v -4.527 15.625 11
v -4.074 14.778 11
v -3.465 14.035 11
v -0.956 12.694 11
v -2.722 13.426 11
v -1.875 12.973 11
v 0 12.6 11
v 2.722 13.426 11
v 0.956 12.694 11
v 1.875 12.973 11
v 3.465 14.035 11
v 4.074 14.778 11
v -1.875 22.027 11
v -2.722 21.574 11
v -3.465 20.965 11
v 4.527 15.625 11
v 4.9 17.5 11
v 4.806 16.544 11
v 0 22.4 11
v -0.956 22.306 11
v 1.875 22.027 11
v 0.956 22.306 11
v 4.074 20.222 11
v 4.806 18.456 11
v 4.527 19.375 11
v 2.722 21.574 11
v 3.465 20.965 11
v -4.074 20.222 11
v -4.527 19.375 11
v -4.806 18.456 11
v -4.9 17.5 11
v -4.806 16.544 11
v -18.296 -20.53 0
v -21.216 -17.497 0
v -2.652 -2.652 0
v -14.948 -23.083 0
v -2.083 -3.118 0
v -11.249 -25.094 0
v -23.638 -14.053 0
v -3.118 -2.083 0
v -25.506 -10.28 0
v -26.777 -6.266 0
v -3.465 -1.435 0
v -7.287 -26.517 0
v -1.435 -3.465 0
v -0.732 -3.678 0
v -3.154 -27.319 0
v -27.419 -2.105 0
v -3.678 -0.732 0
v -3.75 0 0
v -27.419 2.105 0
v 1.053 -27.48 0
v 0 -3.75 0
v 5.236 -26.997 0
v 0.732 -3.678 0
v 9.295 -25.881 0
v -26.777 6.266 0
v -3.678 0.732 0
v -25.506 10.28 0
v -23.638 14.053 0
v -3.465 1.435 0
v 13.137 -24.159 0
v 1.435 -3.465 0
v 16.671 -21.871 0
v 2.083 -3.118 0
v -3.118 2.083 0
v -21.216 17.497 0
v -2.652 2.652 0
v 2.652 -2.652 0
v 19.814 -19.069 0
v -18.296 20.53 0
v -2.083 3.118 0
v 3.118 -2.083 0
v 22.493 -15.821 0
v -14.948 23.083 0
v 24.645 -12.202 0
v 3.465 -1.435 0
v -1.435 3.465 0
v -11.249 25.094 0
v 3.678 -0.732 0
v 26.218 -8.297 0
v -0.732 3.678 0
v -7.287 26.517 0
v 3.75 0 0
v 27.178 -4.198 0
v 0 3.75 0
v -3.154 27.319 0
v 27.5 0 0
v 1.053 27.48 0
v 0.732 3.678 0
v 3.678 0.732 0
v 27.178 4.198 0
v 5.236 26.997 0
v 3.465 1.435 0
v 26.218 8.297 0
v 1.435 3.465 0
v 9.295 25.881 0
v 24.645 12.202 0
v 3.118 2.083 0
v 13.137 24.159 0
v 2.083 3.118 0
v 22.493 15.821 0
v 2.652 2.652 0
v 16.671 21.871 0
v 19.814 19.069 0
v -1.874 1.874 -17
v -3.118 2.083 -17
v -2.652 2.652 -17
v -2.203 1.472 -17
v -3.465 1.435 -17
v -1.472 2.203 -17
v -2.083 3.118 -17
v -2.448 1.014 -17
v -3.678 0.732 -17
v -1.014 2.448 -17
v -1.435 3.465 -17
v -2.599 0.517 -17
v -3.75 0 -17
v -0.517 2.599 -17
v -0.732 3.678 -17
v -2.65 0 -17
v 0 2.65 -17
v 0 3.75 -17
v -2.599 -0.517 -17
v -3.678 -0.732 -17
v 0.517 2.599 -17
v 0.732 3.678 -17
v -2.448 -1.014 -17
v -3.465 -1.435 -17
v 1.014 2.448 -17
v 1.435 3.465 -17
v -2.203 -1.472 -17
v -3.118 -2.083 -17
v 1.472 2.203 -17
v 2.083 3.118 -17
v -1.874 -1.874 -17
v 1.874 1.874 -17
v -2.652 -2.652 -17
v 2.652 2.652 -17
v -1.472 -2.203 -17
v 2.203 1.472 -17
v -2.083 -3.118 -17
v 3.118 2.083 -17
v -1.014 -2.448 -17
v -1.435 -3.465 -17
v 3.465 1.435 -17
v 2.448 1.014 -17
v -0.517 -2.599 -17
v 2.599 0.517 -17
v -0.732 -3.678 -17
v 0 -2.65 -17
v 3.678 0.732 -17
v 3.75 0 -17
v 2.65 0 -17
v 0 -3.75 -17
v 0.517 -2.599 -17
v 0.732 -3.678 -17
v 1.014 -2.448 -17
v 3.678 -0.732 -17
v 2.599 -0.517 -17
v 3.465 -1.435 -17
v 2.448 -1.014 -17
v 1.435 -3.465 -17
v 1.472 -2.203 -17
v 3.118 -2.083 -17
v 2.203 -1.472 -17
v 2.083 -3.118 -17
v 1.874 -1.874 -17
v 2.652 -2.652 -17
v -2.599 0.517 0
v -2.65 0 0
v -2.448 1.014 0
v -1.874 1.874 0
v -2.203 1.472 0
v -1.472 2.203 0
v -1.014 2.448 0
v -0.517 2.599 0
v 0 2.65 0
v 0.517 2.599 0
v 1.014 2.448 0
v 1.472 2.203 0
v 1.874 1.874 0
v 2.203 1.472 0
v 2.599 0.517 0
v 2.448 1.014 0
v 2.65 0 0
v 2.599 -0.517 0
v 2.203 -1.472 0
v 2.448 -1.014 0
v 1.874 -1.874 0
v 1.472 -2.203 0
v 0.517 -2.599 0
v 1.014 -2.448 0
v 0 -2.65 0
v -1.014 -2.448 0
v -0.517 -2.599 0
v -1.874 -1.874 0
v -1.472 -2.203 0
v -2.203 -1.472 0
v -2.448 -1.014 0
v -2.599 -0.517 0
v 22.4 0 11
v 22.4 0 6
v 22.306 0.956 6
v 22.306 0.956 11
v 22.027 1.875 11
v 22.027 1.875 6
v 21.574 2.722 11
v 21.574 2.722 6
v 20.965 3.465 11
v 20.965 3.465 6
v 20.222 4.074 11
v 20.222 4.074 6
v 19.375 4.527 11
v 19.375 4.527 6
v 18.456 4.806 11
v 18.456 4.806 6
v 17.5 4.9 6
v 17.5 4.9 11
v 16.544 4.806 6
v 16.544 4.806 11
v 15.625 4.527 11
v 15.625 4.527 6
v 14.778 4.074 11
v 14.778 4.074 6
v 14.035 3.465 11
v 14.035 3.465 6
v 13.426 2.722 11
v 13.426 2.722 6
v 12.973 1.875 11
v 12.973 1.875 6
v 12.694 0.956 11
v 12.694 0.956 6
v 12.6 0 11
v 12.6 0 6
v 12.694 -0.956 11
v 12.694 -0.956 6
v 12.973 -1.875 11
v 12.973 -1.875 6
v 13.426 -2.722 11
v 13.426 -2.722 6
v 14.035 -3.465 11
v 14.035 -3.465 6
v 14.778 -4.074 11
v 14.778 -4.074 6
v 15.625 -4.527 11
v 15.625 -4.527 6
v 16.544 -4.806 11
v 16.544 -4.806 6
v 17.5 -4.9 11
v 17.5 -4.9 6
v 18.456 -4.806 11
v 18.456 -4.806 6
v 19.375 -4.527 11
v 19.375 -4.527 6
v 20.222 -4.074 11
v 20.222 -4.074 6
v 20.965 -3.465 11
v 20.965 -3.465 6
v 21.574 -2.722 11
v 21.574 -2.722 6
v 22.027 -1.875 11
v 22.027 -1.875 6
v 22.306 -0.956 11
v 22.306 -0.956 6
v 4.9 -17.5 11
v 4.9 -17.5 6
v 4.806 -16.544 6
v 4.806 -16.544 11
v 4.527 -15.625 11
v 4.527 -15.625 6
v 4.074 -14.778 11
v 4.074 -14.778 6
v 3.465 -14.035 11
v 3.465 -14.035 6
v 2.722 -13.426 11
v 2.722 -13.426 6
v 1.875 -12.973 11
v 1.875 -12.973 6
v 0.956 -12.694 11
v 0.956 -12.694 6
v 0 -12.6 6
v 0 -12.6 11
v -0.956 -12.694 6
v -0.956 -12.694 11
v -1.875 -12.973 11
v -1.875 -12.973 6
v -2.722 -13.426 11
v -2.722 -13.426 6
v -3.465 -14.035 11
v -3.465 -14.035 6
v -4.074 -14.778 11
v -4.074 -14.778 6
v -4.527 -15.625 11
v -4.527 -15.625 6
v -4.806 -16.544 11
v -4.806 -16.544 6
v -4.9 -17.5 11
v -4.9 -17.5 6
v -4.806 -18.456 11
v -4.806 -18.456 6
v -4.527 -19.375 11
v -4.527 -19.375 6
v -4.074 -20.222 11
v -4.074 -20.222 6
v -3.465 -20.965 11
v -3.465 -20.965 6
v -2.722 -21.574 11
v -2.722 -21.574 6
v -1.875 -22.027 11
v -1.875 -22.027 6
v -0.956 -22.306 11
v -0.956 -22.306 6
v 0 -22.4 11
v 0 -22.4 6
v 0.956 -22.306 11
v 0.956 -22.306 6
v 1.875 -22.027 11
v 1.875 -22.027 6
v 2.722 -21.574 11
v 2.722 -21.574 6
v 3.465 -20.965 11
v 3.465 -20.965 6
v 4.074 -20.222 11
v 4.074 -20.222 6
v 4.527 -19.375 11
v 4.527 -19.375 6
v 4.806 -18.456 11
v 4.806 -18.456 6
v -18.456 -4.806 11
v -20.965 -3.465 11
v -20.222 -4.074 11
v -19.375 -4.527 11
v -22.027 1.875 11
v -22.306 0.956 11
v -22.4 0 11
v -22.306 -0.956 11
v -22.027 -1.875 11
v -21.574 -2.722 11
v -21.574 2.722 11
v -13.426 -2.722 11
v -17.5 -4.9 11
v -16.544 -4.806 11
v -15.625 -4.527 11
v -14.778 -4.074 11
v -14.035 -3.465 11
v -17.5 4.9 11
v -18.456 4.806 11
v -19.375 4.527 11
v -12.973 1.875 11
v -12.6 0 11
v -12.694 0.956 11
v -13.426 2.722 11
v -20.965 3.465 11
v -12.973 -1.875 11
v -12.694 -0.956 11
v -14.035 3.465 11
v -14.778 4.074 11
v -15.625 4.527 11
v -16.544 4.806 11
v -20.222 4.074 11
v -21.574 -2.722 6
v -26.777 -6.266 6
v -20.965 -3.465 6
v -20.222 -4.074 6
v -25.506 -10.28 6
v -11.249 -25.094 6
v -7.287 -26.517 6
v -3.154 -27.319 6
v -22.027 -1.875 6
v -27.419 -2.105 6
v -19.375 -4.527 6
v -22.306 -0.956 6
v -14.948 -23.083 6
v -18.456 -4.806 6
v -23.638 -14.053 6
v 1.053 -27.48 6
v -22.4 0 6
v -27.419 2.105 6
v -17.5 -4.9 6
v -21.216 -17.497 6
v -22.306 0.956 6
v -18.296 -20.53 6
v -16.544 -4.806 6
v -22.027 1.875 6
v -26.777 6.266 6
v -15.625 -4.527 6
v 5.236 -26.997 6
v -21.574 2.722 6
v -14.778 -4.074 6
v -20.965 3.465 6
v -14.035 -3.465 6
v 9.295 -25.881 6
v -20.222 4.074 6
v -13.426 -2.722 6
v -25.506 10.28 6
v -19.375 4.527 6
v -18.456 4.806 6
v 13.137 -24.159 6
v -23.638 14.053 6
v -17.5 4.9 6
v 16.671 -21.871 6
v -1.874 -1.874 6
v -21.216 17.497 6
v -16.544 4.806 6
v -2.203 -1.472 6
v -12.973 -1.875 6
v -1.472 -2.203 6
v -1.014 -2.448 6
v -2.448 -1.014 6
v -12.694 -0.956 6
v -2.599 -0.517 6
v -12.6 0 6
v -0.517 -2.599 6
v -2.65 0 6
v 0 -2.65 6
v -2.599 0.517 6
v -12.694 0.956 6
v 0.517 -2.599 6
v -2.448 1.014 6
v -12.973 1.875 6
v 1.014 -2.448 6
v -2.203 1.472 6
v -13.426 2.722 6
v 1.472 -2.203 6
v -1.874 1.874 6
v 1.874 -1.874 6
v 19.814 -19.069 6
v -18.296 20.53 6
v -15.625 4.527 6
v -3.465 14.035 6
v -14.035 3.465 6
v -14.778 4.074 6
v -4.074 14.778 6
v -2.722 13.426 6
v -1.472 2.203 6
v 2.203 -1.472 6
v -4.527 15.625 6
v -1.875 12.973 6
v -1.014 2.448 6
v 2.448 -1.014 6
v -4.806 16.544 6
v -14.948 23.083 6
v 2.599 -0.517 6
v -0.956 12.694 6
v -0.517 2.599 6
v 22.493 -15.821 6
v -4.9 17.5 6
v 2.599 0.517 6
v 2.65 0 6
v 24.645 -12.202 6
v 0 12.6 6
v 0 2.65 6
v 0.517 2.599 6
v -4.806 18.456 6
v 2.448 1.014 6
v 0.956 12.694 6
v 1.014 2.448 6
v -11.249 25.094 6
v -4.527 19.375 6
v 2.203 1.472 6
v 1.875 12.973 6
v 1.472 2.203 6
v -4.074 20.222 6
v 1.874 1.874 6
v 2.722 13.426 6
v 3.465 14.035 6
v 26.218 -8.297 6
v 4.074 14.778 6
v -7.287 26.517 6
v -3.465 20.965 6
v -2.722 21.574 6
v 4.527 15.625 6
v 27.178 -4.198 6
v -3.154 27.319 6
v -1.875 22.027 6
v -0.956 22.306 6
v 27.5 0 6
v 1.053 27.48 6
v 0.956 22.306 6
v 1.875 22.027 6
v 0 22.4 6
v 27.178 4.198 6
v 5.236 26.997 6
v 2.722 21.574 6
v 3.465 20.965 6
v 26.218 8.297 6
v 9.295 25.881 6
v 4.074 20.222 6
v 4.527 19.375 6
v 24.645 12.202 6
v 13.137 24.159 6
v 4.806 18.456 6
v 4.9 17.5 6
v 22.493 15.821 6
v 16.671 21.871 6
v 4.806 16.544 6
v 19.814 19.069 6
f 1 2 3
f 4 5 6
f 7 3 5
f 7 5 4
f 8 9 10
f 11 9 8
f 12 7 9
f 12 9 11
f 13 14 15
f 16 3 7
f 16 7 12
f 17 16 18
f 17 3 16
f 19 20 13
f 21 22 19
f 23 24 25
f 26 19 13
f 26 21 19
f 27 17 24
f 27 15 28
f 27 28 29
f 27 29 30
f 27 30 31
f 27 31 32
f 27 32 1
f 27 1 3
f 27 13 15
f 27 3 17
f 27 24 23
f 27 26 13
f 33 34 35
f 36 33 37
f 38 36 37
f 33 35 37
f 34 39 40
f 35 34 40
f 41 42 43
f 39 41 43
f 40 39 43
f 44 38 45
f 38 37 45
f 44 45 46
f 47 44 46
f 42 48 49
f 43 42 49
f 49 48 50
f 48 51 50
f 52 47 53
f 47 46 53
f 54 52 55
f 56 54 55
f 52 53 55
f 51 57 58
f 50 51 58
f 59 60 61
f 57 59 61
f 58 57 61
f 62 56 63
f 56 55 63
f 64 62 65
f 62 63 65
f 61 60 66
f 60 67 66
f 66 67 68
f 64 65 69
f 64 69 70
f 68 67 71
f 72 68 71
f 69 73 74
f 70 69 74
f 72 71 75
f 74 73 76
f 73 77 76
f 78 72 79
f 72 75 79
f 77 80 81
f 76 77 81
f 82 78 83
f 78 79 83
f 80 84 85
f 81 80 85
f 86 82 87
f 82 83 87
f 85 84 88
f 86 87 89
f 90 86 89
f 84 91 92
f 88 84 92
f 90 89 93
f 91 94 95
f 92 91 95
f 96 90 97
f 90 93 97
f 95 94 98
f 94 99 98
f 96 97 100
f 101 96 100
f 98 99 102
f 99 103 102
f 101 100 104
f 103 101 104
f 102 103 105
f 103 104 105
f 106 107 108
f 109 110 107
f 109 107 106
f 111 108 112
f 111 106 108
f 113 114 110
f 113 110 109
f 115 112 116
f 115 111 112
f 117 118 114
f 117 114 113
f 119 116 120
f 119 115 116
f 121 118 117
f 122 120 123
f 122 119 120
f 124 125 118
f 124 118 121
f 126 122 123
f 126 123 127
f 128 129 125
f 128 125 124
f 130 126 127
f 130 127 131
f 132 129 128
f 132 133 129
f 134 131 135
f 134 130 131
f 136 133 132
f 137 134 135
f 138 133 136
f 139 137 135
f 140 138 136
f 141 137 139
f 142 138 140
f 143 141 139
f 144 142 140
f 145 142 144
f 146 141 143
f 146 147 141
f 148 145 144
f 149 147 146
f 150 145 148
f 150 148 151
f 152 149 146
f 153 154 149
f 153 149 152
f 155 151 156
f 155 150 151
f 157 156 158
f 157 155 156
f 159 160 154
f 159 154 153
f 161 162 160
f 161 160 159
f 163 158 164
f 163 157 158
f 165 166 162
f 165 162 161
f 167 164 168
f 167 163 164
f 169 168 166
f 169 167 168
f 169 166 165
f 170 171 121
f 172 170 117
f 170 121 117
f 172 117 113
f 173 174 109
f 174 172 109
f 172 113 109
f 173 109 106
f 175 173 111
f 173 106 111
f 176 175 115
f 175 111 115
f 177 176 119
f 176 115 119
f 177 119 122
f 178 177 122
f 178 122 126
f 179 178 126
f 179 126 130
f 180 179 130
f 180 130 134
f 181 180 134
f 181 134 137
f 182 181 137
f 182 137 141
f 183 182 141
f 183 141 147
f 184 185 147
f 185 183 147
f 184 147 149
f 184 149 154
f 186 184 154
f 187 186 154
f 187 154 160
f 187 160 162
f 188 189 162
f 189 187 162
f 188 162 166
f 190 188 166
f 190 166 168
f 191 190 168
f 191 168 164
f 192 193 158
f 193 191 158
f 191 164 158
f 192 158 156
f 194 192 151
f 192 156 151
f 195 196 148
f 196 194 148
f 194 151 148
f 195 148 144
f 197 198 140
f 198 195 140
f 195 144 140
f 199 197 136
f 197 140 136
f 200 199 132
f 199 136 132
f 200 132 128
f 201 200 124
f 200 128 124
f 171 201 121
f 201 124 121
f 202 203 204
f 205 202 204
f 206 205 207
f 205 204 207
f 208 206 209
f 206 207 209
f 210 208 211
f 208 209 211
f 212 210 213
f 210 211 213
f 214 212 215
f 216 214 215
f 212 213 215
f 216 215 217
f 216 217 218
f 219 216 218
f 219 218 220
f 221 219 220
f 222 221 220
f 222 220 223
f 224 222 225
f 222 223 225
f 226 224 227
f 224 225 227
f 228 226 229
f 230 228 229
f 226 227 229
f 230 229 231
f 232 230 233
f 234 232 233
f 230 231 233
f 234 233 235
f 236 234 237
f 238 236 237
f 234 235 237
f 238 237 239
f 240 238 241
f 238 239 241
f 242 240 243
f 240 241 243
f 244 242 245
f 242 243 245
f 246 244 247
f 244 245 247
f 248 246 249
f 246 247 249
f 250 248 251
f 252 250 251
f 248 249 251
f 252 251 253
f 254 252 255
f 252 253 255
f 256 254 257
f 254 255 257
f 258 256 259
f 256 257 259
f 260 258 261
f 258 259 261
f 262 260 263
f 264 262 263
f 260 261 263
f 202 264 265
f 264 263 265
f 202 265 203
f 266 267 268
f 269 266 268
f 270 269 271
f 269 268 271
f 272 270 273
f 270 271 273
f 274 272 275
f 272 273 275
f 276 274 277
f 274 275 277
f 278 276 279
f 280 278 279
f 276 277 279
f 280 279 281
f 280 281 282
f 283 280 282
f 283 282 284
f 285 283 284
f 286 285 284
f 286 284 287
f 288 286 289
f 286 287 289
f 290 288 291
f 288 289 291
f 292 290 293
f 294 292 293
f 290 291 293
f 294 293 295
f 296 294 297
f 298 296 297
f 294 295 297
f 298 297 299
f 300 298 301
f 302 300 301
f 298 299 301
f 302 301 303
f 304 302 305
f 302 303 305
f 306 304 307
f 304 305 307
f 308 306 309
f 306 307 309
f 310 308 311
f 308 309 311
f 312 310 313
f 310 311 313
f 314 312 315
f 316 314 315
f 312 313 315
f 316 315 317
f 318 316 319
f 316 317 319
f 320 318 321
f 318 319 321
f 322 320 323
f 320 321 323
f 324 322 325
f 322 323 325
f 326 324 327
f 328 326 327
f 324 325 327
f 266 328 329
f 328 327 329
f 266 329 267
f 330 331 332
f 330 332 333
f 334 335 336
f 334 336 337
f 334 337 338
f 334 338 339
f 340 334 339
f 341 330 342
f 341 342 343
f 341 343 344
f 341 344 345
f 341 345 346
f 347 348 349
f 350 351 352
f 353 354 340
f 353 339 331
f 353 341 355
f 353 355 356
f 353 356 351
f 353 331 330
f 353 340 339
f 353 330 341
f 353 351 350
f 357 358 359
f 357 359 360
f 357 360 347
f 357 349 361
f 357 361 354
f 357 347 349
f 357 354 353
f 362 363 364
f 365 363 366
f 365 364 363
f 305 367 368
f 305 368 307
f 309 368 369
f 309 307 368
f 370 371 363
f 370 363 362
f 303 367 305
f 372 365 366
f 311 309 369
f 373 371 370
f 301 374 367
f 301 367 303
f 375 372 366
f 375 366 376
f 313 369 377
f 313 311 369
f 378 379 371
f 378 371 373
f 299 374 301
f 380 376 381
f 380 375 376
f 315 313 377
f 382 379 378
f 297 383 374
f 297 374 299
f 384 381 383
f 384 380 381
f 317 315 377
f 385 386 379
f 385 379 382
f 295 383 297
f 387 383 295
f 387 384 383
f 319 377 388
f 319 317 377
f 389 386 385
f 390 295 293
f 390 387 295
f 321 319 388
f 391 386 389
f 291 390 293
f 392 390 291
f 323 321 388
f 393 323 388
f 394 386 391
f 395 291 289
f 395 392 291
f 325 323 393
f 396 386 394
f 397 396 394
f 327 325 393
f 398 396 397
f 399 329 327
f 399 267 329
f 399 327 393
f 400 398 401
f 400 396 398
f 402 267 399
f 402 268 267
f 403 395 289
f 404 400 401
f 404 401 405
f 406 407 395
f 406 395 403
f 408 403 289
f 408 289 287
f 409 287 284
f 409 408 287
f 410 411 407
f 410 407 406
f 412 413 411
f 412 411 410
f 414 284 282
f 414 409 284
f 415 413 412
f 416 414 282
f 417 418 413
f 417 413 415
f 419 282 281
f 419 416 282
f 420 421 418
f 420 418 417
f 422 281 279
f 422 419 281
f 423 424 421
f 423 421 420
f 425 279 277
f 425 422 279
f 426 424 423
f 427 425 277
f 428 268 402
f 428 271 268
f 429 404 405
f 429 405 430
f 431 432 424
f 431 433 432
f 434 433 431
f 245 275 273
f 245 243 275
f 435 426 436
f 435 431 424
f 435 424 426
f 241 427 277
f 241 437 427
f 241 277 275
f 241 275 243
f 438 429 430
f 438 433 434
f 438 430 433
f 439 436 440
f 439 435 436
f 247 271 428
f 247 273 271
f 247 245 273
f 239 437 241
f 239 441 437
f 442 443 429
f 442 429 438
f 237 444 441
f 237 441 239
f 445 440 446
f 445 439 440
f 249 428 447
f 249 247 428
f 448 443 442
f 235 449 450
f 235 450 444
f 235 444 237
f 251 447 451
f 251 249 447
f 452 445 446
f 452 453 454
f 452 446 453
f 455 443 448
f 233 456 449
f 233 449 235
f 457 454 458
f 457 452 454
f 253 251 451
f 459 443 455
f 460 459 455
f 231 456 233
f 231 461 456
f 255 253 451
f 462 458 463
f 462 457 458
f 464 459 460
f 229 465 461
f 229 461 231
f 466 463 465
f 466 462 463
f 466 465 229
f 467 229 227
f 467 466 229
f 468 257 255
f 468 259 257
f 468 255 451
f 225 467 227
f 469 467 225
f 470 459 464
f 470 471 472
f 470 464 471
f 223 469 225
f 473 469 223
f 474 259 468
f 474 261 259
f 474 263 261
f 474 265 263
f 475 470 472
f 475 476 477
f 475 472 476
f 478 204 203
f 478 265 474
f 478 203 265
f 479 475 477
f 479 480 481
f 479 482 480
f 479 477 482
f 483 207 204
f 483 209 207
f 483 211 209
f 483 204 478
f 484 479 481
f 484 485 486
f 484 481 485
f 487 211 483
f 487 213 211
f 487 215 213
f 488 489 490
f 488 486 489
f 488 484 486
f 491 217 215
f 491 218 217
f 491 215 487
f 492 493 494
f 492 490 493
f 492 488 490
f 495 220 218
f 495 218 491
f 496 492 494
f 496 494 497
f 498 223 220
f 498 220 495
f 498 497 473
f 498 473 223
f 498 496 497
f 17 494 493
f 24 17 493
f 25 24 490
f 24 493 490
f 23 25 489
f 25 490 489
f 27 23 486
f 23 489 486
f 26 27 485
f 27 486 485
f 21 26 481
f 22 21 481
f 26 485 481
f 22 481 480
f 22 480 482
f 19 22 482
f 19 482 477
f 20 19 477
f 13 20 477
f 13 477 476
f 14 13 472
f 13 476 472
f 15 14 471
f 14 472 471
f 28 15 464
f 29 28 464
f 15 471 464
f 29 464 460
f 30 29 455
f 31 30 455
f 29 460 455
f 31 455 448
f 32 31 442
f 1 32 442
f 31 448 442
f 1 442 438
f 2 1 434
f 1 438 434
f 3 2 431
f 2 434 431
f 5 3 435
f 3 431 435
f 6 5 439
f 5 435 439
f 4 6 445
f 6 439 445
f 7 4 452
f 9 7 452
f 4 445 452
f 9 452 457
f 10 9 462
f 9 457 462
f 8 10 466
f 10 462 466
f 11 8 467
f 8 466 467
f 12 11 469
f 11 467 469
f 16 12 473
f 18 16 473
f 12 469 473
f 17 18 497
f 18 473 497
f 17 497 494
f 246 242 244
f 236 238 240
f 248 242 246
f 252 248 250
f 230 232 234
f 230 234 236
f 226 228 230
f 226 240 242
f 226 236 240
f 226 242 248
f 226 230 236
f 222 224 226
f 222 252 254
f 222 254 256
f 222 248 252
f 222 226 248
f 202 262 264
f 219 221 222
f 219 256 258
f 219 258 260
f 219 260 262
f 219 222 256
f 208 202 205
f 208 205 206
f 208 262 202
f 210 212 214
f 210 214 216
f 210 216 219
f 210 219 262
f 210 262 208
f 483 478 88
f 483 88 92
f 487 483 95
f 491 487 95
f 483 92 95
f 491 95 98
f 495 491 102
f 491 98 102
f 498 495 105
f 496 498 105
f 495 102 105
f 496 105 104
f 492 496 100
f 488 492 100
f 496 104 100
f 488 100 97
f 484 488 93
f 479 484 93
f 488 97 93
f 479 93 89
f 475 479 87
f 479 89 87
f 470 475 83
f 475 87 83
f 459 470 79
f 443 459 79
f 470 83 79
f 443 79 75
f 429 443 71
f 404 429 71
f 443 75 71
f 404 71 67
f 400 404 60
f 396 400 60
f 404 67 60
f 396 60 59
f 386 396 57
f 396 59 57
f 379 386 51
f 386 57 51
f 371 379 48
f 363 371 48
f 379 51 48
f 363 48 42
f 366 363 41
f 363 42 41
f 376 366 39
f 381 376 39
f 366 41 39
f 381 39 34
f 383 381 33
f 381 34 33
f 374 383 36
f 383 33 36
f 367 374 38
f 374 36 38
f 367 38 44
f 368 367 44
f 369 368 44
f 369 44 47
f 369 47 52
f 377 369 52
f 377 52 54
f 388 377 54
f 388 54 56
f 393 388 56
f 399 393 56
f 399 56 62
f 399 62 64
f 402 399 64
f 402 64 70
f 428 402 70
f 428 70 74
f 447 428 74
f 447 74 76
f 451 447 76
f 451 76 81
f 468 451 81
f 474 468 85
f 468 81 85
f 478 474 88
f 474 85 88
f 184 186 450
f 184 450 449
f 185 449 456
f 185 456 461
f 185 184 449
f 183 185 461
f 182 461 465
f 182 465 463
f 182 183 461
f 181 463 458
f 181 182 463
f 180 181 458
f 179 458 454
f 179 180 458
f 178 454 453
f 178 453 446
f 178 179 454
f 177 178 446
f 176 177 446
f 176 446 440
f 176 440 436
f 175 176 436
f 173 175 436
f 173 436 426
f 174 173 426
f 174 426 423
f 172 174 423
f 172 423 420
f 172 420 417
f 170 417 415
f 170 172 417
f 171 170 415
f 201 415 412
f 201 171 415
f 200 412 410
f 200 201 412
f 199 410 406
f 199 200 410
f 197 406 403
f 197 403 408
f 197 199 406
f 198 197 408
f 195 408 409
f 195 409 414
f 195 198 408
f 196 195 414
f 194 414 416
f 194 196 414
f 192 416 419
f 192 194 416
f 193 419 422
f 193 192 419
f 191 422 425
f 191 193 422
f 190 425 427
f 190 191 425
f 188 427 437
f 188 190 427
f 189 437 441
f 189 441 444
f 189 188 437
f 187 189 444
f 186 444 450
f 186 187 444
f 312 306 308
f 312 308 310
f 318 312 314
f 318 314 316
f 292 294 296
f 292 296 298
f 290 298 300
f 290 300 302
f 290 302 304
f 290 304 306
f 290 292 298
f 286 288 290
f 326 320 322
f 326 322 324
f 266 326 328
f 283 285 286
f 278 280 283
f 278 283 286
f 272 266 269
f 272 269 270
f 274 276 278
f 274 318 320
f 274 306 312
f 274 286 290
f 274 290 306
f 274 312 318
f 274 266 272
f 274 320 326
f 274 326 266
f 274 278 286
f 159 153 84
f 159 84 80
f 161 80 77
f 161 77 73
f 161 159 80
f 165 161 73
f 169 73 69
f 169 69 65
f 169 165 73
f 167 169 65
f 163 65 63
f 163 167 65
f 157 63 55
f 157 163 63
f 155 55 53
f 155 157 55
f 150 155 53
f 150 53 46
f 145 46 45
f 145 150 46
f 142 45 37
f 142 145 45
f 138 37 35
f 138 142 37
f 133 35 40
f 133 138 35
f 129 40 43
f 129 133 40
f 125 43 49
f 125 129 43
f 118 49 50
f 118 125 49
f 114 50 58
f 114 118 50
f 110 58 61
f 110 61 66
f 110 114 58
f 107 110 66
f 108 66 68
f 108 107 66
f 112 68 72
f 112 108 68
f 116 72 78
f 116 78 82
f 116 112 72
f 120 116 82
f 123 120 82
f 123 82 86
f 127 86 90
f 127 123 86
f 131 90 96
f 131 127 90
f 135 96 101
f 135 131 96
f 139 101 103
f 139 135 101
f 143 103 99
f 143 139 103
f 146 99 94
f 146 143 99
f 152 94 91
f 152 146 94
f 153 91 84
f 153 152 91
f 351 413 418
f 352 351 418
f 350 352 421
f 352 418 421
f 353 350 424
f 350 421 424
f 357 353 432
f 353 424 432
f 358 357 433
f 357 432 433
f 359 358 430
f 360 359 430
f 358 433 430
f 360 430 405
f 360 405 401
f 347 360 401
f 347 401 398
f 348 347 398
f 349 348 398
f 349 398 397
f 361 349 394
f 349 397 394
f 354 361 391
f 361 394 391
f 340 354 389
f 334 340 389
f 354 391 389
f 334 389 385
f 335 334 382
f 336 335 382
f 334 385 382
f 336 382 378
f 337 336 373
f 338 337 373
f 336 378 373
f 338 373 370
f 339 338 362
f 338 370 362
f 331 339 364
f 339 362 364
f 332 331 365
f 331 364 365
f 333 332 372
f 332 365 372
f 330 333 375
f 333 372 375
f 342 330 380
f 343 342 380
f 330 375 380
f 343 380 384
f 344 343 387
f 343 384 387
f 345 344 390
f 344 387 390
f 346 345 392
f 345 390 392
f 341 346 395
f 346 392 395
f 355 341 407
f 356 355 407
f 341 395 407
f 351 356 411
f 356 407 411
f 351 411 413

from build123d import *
from build123d.topology import SkipClean

# Parameters (mm, degrees)
SKETCH1_R           = 27.5
SKETCH1_R_2         = 2.65
BOSS_EXTRUDE1_DEPTH = 6
SKETCH2_R           = 4.9
BOSS_EXTRUDE2_DEPTH = 5
BOSS_EXTRUDE3_START = 17
SKETCH3_R           = 3.75
SKETCH3_R_2         = 2.65
BOSS_EXTRUDE3_DEPTH = 17


with BuildPart() as part:
    # Sketch1 → Boss-Extrude1 (new body)
    with BuildSketch(Plane.XY):
        Circle(SKETCH1_R)
        Circle(SKETCH1_R_2, mode=Mode.SUBTRACT)
    extrude(amount=BOSS_EXTRUDE1_DEPTH)

    # Sketch2 → Boss-Extrude2 (add)
    with BuildSketch(Plane.XY.offset(6)):
        with Locations((0, 17.5)):
            Circle(SKETCH2_R)
        with Locations((17.5, 0)):
            Circle(SKETCH2_R)
        with Locations((0, -17.5)):
            Circle(SKETCH2_R)
        with Locations((-17.5, 0)):
            Circle(SKETCH2_R)
    extrude(amount=BOSS_EXTRUDE2_DEPTH)

    # Sketch3 → Boss-Extrude3 (add)
    with SkipClean():  # the faces are left unmerged after this step: merging them gives an invalid solid
        with BuildSketch(Plane(origin=(0, 0, 0), x_dir=(-1, 0, 0), z_dir=(0, 0, -1)).offset(BOSS_EXTRUDE3_START)):
            with Locations(Location((0, 0, 0), (0, 0, 180))):
                Circle(SKETCH3_R)
            Circle(SKETCH3_R_2, mode=Mode.SUBTRACT)
        extrude(amount=-BOSS_EXTRUDE3_DEPTH)


solid = part.part
